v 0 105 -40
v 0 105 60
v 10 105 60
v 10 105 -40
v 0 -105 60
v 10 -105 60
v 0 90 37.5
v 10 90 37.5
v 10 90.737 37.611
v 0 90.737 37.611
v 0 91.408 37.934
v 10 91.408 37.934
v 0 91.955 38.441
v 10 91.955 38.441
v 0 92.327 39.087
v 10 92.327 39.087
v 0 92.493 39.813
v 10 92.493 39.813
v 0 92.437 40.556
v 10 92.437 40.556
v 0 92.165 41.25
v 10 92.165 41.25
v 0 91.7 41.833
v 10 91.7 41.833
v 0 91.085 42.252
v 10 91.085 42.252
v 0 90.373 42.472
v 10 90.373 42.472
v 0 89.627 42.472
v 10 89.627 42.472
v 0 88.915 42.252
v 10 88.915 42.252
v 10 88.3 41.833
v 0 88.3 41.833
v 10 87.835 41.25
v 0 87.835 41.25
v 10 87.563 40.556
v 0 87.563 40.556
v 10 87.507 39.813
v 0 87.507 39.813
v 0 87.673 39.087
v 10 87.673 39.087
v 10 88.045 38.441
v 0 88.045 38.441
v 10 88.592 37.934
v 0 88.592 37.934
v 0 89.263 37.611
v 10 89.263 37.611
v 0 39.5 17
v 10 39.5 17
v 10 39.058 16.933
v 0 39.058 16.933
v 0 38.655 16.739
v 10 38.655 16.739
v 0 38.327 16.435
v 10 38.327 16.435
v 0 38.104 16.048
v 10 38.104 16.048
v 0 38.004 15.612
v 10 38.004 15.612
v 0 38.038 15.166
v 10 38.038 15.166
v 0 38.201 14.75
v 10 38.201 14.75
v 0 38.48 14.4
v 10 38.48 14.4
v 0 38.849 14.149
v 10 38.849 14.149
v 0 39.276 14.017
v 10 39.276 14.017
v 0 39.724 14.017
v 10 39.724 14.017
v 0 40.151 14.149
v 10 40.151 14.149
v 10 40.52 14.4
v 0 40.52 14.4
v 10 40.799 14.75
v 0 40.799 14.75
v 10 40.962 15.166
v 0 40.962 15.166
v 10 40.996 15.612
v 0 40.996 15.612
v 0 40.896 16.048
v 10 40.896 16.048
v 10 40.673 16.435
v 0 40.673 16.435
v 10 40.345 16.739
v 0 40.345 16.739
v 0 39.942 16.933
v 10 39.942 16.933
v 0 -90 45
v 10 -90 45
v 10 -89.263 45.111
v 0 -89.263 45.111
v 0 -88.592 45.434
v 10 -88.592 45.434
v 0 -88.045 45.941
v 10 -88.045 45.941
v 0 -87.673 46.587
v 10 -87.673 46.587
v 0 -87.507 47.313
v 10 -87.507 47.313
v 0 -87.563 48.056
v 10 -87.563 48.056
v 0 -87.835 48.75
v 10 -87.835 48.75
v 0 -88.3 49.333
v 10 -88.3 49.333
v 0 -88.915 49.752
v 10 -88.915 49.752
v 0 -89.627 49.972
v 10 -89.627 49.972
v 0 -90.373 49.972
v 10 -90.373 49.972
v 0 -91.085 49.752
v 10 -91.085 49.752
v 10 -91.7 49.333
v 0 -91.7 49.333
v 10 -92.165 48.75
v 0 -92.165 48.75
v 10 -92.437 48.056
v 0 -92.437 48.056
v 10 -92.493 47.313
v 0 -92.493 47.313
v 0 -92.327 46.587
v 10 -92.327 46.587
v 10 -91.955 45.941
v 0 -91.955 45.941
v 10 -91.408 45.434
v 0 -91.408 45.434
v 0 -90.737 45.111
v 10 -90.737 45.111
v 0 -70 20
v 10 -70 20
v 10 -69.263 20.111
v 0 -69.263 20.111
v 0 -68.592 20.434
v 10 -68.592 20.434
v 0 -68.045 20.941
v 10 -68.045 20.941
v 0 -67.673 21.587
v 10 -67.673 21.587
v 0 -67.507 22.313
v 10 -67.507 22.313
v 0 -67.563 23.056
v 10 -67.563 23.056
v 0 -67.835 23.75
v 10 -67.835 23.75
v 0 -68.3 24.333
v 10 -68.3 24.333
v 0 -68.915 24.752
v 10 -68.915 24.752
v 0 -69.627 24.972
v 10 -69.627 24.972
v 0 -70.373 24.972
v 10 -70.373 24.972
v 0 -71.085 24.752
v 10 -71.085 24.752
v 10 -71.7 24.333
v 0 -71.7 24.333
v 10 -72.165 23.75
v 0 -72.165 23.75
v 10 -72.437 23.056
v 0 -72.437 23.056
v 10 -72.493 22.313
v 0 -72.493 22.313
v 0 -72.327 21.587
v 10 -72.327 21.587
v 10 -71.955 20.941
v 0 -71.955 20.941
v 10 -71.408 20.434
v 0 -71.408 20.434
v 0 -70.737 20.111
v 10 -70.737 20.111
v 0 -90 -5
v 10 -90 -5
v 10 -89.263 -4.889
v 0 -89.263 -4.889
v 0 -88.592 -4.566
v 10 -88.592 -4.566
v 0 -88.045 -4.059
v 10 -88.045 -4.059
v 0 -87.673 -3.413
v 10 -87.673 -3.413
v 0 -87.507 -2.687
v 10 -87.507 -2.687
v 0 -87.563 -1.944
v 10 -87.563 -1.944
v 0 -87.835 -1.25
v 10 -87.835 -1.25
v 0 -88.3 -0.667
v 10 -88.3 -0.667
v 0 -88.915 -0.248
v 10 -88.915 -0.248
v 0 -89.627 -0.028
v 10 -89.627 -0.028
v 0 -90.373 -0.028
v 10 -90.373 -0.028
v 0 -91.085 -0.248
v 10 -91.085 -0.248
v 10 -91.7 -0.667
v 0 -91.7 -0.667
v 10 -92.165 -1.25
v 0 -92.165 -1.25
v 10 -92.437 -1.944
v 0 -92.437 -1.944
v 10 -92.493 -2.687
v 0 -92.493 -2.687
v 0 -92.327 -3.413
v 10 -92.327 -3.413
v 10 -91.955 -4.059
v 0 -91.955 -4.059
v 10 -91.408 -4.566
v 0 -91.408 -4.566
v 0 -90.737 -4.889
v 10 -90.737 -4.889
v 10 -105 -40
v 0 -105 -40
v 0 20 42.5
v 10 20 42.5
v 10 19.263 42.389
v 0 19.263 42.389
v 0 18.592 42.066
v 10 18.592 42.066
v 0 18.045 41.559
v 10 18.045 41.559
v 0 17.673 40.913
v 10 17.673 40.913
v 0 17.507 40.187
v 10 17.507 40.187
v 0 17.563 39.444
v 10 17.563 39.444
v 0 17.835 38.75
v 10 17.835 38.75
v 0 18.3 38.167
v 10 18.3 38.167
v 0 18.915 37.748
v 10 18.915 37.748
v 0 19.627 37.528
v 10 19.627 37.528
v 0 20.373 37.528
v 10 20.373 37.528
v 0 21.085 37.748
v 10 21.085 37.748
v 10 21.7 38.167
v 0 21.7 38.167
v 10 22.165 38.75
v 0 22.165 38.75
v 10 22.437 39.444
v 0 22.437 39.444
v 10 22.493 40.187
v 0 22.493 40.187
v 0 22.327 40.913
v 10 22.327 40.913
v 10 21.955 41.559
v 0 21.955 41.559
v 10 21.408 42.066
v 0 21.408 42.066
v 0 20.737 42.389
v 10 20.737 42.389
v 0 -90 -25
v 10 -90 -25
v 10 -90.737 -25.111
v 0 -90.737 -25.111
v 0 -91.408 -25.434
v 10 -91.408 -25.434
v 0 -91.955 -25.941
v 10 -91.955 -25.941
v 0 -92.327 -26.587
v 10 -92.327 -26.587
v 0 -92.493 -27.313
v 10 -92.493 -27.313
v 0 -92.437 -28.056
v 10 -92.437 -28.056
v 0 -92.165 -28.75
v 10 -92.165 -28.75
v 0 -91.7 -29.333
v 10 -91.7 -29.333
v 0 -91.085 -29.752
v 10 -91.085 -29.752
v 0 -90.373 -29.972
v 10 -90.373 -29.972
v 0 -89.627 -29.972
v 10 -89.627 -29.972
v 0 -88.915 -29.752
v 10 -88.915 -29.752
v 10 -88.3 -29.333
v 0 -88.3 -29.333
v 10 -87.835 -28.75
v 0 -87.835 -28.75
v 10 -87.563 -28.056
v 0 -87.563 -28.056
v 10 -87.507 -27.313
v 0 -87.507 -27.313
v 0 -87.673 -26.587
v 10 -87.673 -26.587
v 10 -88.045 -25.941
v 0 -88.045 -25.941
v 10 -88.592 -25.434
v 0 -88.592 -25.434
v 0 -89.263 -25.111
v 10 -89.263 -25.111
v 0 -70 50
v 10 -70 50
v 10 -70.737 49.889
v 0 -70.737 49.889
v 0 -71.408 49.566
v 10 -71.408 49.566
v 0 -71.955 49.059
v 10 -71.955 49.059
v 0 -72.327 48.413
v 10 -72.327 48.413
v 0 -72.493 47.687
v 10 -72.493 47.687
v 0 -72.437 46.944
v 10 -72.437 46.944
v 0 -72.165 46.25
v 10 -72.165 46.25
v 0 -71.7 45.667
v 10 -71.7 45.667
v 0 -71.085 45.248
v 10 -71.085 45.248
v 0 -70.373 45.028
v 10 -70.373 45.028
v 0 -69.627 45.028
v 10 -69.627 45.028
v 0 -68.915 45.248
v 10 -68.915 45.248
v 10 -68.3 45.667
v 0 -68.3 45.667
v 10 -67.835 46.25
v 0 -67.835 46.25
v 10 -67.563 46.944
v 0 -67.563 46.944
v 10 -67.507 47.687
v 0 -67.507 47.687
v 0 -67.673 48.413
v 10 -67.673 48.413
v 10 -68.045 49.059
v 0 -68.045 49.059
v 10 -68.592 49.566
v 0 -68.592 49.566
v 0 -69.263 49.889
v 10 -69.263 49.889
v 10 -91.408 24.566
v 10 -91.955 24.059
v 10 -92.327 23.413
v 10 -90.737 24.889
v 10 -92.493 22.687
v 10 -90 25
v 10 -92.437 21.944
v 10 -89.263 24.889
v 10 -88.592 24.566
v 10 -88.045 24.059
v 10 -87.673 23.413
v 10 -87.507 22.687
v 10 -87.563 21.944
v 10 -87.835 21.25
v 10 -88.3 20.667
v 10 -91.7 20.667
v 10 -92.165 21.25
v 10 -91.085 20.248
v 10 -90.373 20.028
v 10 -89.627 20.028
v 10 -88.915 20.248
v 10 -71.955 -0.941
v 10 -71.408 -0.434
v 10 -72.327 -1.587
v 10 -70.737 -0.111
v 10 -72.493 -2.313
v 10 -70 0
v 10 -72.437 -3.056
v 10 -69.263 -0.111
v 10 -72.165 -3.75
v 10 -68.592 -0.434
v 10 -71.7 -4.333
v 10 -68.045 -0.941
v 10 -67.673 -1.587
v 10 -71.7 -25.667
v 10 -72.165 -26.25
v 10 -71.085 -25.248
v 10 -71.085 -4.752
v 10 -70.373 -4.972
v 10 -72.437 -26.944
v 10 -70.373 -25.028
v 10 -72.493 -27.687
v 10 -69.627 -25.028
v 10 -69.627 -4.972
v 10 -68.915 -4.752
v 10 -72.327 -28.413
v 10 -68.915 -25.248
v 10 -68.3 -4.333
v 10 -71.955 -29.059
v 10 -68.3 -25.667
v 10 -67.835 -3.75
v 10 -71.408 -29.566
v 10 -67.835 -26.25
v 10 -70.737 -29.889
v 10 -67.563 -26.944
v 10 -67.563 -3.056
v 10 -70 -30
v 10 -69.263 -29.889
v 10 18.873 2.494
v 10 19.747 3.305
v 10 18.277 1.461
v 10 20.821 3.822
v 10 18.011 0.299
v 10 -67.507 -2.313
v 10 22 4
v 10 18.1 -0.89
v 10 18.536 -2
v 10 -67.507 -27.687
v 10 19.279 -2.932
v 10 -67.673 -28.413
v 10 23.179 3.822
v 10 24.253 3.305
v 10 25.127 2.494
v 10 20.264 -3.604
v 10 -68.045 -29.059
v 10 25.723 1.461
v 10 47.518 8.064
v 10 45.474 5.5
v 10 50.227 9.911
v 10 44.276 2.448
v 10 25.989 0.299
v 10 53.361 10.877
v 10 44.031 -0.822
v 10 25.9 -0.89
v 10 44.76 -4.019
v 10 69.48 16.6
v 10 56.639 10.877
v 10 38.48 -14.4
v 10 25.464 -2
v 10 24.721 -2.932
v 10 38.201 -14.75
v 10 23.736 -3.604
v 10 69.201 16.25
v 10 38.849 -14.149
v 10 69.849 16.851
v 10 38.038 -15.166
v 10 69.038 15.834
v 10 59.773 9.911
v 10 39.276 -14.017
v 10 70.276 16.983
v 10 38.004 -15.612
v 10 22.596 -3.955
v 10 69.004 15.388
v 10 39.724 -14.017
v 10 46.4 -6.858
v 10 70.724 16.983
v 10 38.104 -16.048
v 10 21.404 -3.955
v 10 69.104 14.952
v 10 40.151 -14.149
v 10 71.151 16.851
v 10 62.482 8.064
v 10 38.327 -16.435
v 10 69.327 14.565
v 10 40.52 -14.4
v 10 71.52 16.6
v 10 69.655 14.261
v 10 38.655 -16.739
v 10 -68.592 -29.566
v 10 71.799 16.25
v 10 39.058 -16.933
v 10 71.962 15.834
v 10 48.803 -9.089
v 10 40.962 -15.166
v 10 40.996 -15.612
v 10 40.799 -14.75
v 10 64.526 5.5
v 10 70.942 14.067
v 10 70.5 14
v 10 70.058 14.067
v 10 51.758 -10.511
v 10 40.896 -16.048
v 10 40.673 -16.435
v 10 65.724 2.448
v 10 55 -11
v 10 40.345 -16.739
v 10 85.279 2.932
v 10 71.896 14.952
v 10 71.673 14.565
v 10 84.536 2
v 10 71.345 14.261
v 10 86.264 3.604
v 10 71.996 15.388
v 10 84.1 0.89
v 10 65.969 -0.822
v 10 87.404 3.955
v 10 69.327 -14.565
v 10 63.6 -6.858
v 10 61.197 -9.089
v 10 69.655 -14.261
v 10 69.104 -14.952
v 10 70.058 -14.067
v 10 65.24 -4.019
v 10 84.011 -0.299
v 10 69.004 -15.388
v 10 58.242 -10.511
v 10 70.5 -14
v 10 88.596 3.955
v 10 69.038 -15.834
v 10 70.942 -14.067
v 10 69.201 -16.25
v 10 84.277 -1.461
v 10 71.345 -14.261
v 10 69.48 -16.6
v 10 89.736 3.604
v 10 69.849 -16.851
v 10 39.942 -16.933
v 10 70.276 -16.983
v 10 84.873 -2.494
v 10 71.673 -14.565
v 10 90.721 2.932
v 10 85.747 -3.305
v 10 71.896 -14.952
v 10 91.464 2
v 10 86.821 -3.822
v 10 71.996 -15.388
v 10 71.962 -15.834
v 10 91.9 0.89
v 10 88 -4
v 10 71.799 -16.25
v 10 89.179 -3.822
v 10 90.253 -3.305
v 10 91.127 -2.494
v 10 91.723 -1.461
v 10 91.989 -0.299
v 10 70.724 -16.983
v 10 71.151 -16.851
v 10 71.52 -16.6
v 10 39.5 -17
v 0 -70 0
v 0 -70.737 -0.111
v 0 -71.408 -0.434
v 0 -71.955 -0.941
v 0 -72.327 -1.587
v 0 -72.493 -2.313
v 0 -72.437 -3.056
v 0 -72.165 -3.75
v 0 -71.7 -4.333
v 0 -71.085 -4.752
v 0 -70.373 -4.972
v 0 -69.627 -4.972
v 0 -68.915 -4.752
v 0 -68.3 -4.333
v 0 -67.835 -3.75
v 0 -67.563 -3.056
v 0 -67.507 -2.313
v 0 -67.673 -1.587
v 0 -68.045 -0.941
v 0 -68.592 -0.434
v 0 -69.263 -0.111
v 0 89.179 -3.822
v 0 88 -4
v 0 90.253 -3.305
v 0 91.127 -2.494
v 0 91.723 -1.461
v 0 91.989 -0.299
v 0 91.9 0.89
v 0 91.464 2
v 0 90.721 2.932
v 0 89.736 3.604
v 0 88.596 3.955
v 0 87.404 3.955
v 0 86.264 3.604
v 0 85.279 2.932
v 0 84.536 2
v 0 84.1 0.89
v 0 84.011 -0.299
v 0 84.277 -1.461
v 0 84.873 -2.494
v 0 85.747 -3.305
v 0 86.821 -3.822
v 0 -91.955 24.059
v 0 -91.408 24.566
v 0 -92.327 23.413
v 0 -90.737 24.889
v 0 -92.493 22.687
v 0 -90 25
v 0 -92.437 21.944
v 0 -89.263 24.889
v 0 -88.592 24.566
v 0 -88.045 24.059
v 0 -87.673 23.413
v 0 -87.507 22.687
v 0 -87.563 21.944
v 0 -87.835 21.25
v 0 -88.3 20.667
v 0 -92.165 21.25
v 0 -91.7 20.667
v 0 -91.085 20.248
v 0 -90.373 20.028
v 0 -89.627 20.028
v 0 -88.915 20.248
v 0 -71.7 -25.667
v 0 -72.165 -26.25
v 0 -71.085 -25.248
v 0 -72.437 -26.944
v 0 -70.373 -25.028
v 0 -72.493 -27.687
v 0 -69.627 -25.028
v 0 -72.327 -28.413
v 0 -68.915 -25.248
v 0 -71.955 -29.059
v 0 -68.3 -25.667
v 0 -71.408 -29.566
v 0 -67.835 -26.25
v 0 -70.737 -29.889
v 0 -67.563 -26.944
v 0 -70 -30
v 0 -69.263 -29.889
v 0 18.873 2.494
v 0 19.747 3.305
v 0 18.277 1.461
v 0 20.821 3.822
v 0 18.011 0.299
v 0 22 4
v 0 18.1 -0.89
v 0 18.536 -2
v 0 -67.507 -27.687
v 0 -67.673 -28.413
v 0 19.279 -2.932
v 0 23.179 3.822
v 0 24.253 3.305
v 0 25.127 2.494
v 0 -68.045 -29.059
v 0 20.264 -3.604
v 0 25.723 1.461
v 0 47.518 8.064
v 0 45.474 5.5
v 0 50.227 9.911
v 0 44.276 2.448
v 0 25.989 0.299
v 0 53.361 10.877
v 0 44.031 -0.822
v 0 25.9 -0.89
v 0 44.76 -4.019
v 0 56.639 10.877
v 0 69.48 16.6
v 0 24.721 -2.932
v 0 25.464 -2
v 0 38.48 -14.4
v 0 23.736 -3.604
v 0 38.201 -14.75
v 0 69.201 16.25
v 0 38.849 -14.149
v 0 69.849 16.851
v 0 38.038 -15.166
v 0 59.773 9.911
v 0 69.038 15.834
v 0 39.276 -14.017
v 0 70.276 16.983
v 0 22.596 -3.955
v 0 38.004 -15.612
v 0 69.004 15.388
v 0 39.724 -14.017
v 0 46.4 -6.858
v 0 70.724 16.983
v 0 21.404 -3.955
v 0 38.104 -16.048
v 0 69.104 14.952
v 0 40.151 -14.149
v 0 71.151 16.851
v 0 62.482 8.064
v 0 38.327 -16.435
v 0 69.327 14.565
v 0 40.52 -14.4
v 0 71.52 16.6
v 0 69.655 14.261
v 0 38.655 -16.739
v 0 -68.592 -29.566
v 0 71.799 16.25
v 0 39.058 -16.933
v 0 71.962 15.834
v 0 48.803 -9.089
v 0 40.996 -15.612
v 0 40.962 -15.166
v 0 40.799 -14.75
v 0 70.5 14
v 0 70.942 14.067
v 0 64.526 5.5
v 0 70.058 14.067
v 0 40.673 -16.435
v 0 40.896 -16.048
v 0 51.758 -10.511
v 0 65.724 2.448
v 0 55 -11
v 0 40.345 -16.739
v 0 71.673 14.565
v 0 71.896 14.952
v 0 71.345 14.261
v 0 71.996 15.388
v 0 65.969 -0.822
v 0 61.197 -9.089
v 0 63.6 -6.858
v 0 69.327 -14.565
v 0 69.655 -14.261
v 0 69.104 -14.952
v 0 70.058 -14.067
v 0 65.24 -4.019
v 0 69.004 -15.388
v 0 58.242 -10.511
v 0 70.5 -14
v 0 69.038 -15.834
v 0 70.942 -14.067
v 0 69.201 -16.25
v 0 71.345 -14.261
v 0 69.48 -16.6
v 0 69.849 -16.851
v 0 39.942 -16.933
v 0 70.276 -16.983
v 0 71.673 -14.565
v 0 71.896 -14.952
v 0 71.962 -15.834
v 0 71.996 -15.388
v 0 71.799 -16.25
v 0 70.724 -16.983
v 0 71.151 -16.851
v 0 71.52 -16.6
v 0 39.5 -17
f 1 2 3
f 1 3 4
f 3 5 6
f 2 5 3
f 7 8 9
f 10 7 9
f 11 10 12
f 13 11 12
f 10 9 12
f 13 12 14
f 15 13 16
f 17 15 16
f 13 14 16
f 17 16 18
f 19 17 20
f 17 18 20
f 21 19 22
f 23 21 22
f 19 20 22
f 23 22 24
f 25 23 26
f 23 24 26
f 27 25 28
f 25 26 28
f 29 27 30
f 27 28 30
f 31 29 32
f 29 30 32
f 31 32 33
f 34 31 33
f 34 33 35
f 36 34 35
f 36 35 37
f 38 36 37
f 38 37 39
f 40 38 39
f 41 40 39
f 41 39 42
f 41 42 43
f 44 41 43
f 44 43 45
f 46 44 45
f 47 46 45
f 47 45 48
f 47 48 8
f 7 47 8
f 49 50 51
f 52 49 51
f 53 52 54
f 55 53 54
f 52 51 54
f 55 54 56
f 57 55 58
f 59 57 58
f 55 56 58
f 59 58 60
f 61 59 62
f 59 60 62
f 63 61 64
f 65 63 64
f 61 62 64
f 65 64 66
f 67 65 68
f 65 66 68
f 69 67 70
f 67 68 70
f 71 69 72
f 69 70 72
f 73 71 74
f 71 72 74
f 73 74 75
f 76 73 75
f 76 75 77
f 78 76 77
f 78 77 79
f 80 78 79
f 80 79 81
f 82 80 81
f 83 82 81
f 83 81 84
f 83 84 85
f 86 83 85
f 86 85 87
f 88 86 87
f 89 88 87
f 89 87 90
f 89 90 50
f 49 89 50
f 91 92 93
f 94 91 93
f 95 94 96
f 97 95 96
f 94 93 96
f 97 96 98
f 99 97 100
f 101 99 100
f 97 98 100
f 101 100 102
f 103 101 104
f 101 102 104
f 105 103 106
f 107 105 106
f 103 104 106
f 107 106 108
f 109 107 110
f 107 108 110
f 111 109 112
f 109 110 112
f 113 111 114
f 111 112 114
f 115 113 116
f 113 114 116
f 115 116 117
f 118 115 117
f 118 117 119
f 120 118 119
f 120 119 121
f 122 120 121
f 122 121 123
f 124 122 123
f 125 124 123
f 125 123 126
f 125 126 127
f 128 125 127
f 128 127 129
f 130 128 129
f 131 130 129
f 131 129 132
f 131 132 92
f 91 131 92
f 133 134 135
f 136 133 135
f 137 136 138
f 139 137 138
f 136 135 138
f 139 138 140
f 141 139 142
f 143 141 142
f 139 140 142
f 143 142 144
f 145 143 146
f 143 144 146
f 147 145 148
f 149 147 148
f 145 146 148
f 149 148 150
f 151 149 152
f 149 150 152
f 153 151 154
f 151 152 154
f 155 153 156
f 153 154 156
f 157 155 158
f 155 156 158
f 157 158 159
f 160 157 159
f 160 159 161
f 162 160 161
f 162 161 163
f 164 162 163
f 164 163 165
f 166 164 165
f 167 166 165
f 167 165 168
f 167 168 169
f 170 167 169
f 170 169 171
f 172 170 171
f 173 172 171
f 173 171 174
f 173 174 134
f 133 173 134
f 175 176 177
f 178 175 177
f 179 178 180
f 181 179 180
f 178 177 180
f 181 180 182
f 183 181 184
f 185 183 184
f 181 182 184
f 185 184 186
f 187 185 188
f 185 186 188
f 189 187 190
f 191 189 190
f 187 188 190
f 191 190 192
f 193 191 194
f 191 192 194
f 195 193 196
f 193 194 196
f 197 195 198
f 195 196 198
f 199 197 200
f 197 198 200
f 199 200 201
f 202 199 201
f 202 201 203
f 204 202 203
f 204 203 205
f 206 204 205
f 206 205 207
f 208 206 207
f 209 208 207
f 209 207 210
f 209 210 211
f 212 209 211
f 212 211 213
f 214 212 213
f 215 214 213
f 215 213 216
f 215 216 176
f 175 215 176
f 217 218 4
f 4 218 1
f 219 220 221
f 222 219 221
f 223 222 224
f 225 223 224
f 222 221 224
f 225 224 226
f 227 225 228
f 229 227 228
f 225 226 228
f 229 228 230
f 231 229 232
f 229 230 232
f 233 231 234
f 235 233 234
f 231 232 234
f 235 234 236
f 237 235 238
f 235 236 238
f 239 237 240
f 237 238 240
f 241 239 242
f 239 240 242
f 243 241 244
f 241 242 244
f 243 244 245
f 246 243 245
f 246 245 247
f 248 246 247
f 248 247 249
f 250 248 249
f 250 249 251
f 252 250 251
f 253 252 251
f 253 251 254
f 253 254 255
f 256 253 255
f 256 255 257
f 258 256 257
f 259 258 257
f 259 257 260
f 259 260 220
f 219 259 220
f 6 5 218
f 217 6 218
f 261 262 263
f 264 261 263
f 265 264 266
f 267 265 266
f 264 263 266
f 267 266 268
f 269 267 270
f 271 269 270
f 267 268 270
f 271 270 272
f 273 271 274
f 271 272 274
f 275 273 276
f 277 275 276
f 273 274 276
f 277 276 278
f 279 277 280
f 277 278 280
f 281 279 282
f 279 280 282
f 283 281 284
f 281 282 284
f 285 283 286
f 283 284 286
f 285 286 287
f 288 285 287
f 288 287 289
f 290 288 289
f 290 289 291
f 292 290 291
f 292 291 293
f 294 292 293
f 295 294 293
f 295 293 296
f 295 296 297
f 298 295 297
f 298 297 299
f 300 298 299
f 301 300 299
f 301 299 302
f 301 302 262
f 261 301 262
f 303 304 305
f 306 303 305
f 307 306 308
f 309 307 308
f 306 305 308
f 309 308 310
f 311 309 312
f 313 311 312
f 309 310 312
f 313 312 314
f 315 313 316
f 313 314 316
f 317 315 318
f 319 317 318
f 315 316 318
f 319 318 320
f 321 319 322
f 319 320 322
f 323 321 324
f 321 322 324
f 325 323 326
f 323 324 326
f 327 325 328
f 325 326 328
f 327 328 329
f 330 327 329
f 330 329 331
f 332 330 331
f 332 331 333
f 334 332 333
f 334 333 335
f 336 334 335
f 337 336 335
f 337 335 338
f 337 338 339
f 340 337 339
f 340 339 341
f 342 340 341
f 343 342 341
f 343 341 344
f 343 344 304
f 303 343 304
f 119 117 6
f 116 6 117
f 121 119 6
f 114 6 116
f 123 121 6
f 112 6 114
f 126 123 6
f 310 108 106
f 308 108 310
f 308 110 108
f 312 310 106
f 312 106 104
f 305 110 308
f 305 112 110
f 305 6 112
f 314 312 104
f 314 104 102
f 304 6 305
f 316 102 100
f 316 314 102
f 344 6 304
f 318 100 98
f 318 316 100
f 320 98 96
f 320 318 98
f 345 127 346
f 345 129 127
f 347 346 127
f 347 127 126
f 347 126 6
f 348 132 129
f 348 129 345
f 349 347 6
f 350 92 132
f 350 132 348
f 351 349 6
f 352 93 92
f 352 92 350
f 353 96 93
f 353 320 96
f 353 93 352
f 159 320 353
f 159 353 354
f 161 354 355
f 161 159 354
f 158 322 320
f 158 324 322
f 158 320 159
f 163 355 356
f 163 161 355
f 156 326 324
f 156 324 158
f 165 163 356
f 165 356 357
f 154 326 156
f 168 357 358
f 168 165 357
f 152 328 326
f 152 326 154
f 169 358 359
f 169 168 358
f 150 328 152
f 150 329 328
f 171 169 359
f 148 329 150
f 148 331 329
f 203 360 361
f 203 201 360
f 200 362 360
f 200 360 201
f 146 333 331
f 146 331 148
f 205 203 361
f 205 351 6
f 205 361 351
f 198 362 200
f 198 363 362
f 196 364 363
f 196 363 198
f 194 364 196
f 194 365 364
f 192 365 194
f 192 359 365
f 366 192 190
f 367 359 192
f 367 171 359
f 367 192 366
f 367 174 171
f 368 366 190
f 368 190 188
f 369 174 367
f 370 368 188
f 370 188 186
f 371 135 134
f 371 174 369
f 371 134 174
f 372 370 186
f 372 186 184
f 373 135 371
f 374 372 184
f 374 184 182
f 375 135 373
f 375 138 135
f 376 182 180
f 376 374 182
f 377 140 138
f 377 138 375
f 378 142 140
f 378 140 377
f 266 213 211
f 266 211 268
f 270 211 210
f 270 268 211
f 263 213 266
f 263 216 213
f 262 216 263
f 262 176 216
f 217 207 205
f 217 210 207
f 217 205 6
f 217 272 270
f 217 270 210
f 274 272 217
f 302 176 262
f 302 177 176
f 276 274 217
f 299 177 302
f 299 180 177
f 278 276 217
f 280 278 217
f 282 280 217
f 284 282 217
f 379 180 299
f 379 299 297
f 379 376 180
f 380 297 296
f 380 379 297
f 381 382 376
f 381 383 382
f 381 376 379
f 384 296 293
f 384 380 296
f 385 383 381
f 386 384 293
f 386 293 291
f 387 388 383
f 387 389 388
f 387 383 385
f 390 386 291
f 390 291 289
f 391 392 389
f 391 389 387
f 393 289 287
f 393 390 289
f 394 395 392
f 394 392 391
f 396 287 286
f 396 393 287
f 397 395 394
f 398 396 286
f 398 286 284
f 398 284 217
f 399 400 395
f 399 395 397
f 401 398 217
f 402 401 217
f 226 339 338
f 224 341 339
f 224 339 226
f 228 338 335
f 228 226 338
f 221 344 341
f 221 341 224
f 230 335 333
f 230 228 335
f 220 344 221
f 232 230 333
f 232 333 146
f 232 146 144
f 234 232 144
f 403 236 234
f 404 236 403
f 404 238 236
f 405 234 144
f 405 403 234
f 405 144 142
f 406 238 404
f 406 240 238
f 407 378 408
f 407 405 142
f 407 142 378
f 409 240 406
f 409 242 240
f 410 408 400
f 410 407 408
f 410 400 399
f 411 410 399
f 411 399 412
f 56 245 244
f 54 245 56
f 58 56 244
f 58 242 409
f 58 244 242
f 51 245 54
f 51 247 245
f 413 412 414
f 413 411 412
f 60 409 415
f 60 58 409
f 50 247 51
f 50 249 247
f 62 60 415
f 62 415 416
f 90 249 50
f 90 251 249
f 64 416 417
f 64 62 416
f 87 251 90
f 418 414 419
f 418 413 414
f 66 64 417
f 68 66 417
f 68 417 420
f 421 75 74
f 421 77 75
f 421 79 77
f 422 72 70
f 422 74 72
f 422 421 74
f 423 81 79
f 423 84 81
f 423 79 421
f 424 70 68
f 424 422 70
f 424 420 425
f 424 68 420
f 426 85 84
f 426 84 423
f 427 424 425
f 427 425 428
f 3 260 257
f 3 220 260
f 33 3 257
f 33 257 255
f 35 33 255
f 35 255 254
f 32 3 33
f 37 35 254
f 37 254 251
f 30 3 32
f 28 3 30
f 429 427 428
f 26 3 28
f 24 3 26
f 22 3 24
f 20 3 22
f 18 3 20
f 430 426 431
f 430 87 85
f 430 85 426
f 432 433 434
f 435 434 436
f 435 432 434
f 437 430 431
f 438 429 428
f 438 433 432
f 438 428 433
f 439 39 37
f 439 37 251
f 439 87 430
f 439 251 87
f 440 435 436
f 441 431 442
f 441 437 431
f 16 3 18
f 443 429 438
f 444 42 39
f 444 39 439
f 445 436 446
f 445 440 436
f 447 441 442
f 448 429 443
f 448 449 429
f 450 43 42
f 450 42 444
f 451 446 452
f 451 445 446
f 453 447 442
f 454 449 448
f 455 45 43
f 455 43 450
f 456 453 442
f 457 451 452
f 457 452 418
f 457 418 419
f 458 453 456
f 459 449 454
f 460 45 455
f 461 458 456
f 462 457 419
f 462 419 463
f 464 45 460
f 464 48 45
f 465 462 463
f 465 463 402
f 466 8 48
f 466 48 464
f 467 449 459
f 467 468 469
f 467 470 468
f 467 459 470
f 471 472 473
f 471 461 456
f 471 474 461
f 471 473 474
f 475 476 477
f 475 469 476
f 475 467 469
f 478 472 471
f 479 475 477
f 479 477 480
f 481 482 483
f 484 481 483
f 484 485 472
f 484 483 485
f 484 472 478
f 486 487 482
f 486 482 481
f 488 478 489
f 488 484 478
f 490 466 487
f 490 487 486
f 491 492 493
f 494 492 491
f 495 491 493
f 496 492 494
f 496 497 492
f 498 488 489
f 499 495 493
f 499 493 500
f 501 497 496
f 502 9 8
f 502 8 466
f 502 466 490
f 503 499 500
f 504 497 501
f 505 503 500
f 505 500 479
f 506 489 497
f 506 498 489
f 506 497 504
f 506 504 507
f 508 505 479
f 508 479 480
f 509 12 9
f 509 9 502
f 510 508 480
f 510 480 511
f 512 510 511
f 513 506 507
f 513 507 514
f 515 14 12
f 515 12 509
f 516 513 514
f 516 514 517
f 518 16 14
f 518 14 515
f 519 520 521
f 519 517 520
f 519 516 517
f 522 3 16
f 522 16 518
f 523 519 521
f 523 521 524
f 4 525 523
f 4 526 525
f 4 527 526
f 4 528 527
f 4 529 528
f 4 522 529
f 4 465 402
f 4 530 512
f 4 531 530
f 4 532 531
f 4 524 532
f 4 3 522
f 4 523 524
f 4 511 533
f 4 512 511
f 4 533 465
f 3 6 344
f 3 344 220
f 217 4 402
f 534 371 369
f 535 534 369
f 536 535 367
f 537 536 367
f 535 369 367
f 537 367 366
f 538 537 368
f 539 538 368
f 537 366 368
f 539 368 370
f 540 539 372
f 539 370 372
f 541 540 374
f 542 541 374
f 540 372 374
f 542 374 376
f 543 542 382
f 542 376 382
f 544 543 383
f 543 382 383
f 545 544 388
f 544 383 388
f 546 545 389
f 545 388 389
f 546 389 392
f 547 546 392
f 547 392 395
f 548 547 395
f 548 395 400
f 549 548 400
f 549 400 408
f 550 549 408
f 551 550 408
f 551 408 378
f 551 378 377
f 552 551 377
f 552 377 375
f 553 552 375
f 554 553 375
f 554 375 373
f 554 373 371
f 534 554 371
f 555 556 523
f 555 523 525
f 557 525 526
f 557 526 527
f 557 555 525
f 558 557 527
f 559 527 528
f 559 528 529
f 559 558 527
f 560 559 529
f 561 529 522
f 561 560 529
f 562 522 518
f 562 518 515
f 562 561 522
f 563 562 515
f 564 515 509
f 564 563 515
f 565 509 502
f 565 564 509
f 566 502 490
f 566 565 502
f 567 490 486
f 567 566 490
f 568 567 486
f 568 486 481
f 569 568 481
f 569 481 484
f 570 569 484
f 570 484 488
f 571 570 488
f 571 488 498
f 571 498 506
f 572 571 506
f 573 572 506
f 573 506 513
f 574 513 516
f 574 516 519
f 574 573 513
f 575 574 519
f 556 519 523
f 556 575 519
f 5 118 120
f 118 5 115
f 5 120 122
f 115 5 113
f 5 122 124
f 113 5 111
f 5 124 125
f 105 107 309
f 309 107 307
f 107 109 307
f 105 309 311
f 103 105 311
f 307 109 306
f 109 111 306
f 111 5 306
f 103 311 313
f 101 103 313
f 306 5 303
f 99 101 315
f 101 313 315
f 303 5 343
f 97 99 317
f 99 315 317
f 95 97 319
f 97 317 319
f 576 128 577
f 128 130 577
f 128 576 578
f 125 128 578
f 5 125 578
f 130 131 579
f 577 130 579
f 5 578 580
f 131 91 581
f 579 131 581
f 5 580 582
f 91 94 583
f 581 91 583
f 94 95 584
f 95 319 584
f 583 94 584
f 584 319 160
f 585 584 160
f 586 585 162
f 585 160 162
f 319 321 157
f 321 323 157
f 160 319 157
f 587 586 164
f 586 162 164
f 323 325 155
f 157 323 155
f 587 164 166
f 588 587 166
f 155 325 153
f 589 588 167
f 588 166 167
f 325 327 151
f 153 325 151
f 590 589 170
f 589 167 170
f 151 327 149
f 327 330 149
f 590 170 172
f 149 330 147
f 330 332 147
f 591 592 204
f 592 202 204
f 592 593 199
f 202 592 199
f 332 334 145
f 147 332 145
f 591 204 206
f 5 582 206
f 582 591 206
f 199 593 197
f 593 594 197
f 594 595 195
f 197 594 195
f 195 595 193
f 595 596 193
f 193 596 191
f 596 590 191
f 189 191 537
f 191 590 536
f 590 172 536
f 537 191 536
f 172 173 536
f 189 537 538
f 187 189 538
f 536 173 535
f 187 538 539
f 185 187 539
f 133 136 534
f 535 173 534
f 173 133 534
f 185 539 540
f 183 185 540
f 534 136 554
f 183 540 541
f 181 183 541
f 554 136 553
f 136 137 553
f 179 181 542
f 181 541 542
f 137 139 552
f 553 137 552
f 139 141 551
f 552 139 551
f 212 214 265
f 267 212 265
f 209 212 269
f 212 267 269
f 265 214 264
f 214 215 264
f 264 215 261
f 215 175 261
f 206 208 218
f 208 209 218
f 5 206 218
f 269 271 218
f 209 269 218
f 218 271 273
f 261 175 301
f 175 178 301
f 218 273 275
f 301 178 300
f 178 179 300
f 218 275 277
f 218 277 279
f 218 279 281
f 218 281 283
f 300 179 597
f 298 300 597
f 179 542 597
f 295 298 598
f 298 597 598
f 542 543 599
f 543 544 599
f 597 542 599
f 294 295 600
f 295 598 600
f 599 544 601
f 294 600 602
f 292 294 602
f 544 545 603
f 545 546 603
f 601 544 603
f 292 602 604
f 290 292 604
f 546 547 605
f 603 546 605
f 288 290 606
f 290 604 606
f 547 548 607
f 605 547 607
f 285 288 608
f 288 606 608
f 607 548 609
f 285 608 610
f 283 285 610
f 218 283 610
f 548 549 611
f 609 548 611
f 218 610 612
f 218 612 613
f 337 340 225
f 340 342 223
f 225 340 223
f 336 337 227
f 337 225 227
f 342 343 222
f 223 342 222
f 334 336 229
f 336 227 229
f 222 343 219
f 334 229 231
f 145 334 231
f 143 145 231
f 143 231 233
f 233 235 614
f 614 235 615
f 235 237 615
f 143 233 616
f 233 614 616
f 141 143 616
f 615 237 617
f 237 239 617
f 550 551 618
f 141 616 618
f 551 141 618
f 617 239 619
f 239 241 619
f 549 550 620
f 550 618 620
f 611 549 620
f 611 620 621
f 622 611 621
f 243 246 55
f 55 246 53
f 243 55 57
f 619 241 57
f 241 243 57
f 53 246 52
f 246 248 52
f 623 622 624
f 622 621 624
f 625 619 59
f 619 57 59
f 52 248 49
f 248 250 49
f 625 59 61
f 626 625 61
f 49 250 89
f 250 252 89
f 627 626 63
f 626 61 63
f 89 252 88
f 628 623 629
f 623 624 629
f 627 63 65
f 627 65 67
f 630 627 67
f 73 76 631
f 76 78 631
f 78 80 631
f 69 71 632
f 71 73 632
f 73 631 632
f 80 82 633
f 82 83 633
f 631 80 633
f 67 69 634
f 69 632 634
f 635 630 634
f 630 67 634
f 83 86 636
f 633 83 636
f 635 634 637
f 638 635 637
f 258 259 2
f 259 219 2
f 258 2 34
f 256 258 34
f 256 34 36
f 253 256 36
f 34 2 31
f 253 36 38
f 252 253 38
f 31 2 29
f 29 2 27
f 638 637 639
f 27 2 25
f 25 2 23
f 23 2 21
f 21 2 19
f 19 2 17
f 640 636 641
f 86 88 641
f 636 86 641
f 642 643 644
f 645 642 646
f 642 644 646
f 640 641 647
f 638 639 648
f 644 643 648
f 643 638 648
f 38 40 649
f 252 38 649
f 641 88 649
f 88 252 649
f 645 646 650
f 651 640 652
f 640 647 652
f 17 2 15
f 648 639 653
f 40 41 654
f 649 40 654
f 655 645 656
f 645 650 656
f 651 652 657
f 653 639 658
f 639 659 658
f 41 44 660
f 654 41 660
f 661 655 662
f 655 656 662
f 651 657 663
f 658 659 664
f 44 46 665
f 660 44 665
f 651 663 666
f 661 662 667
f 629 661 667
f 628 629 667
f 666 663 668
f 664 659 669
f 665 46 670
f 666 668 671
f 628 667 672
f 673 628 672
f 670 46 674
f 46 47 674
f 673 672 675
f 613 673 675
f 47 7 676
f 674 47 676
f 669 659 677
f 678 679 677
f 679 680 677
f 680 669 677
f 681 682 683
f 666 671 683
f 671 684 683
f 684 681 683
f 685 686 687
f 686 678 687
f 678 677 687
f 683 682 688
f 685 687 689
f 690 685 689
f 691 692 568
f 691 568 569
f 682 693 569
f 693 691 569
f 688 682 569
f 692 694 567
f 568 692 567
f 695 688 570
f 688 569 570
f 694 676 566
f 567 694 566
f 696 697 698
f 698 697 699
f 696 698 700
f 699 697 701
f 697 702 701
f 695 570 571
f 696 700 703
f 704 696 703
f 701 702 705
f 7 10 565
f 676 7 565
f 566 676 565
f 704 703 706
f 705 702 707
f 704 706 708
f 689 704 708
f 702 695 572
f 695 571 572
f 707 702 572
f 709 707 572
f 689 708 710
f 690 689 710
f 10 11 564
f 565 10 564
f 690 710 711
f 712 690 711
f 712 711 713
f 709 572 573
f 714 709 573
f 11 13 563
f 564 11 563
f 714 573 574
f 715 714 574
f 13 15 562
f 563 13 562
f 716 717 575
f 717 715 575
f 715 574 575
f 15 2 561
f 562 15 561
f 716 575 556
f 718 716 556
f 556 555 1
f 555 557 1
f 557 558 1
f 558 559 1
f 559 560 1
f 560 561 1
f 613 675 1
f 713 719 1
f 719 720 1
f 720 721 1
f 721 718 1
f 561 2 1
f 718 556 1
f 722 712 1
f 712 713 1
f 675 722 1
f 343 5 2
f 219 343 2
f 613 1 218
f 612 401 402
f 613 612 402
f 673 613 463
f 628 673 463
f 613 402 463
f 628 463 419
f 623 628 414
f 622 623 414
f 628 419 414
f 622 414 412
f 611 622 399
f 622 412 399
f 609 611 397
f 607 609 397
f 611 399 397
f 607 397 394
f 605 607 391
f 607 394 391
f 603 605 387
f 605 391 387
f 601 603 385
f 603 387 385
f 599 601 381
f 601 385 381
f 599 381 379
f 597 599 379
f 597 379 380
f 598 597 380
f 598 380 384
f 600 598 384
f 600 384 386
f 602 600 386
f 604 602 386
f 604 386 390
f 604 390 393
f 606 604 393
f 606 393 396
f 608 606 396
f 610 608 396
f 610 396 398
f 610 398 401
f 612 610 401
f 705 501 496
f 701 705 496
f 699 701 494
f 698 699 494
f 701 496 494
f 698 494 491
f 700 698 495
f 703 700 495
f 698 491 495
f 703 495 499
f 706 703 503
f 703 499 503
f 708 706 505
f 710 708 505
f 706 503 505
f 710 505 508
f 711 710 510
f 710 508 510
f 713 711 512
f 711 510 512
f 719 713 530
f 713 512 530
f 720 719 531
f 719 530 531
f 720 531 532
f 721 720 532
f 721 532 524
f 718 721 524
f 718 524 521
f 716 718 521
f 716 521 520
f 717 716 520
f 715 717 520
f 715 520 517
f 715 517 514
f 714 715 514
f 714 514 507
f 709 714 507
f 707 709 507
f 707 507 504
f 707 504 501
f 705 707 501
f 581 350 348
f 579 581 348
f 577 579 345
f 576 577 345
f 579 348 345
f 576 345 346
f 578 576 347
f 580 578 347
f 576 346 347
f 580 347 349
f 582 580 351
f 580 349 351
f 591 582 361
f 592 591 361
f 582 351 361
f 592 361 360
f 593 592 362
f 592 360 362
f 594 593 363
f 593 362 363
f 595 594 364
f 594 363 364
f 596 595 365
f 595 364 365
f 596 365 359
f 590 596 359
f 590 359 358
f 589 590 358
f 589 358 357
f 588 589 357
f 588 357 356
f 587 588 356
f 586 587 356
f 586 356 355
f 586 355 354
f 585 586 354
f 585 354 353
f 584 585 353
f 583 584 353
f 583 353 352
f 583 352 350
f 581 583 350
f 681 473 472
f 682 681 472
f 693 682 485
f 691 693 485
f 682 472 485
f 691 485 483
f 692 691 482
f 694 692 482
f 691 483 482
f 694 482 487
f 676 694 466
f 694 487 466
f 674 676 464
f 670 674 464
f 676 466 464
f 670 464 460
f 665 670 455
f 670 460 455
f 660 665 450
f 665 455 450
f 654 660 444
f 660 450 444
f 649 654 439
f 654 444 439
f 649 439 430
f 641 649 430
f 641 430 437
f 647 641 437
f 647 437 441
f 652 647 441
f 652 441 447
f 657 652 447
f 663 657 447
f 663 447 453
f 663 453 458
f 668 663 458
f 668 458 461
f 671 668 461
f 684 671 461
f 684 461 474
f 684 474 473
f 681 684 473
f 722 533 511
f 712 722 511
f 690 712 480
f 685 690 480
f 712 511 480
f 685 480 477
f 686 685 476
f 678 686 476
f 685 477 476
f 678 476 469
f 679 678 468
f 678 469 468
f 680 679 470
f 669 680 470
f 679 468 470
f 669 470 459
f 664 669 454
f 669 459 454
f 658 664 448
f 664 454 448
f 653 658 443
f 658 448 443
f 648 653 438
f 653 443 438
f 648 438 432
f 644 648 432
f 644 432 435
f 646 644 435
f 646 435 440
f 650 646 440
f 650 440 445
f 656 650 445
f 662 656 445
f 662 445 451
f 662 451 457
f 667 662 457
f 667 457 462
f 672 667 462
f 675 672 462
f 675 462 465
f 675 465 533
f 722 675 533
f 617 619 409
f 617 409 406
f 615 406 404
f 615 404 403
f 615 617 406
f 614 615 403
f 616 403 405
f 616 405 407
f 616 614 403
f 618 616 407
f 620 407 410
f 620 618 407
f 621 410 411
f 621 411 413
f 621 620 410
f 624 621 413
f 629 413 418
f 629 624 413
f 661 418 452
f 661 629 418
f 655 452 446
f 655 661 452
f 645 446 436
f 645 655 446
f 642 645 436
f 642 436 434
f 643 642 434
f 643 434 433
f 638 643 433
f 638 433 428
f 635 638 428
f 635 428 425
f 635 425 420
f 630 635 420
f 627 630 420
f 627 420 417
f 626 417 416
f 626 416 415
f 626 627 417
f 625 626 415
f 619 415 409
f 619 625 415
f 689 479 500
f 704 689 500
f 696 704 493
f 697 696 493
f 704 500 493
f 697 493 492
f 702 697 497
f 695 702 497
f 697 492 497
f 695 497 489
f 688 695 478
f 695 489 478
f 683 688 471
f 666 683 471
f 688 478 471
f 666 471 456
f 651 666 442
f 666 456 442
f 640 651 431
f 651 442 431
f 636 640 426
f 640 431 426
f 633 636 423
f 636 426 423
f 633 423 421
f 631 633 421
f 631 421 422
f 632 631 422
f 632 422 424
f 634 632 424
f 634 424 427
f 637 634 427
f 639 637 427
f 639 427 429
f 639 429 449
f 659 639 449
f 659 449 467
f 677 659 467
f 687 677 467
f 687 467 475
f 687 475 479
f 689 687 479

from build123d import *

# Parameters (mm, degrees)
SKETCH2_W                   = 100
SKETCH2_H                   = 210
SKETCH2_R                   = 4
BOSS_EXTRUDE1_DEPTH         = 10
SKETCH3_R                   = 2.5
MOUNT_DEPTH                 = 122.346610995
SKETCH7_R                   = 2.5
SUPPORT_PROFILE_MOUNT_DEPTH = 122.346610995
SKETCH4_R                   = 11
SKETCH4_R_2                 = 1.5
STEPPER_MOUNT_DEPTH         = 122.346610995


with BuildPart() as part:
    # Sketch2 → Boss-Extrude1 (new body)
    with BuildSketch(Plane(origin=(0, 0, 0), x_dir=(0, 0, -1), z_dir=(1, 0, 0))):
        with Locations((-10, 0)):
            Rectangle(SKETCH2_W, SKETCH2_H)
        with Locations((0, 88)):
            Circle(SKETCH2_R, mode=Mode.SUBTRACT)
        with Locations(Location((0, 22, 0), (0, 0, 180))):
            Circle(SKETCH2_R, mode=Mode.SUBTRACT)
    extrude(amount=BOSS_EXTRUDE1_DEPTH)

    # Sketch3 → mount (cut, through all)
    with BuildSketch(Plane(origin=(10, 0, 0), x_dir=(0, 0, -1), z_dir=(1, 0, 0))):
        with Locations((-22.5, -70)):
            Circle(SKETCH3_R)
        with Locations(Location((-47.5, -70, 0), (0, 0, 180))):
            Circle(SKETCH3_R)
        with Locations((-47.5, -90)):
            Circle(SKETCH3_R)
        with Locations(Location((-22.5, -90, 0), (0, 0, 180))):
            Circle(SKETCH3_R)
        with Locations((2.5, -90)):
            Circle(SKETCH3_R)
        with Locations(Location((27.5, -90, 0), (0, 0, 180))):
            Circle(SKETCH3_R)
        with Locations((27.5, -70)):
            Circle(SKETCH3_R)
        with Locations(Location((2.5, -70, 0), (0, 0, 180))):
            Circle(SKETCH3_R)
    extrude(amount=-MOUNT_DEPTH, mode=Mode.SUBTRACT)

    # Sketch7 → support_profile_mount (cut, through all)
    with BuildSketch(Plane(origin=(10, 0, 0), x_dir=(0, 0, -1), z_dir=(1, 0, 0))):
        with Locations((-40, 90)):
            Circle(SKETCH7_R)
        with Locations(Location((-40, 20, 0), (0, 0, 180))):
            Circle(SKETCH7_R)
    extrude(amount=-SUPPORT_PROFILE_MOUNT_DEPTH, mode=Mode.SUBTRACT)

    # Sketch4 → stepper_mount (cut, through all)
    with BuildSketch(Plane(origin=(10, 0, 0), x_dir=(0, 0, -1), z_dir=(1, 0, 0))):
        with Locations((0, 55)):
            Circle(SKETCH4_R)
        with Locations((-15.5, 70.5)):
            Circle(SKETCH4_R_2)
        with Locations(Location((15.5, 70.5, 0), (0, 0, 180))):
            Circle(SKETCH4_R_2)
        with Locations(Location((-15.5, 39.5, 0), (0, 0, 180))):
            Circle(SKETCH4_R_2)
        with Locations((15.5, 39.5)):
            Circle(SKETCH4_R_2)
    extrude(amount=-STEPPER_MOUNT_DEPTH, mode=Mode.SUBTRACT)


solid = part.part
